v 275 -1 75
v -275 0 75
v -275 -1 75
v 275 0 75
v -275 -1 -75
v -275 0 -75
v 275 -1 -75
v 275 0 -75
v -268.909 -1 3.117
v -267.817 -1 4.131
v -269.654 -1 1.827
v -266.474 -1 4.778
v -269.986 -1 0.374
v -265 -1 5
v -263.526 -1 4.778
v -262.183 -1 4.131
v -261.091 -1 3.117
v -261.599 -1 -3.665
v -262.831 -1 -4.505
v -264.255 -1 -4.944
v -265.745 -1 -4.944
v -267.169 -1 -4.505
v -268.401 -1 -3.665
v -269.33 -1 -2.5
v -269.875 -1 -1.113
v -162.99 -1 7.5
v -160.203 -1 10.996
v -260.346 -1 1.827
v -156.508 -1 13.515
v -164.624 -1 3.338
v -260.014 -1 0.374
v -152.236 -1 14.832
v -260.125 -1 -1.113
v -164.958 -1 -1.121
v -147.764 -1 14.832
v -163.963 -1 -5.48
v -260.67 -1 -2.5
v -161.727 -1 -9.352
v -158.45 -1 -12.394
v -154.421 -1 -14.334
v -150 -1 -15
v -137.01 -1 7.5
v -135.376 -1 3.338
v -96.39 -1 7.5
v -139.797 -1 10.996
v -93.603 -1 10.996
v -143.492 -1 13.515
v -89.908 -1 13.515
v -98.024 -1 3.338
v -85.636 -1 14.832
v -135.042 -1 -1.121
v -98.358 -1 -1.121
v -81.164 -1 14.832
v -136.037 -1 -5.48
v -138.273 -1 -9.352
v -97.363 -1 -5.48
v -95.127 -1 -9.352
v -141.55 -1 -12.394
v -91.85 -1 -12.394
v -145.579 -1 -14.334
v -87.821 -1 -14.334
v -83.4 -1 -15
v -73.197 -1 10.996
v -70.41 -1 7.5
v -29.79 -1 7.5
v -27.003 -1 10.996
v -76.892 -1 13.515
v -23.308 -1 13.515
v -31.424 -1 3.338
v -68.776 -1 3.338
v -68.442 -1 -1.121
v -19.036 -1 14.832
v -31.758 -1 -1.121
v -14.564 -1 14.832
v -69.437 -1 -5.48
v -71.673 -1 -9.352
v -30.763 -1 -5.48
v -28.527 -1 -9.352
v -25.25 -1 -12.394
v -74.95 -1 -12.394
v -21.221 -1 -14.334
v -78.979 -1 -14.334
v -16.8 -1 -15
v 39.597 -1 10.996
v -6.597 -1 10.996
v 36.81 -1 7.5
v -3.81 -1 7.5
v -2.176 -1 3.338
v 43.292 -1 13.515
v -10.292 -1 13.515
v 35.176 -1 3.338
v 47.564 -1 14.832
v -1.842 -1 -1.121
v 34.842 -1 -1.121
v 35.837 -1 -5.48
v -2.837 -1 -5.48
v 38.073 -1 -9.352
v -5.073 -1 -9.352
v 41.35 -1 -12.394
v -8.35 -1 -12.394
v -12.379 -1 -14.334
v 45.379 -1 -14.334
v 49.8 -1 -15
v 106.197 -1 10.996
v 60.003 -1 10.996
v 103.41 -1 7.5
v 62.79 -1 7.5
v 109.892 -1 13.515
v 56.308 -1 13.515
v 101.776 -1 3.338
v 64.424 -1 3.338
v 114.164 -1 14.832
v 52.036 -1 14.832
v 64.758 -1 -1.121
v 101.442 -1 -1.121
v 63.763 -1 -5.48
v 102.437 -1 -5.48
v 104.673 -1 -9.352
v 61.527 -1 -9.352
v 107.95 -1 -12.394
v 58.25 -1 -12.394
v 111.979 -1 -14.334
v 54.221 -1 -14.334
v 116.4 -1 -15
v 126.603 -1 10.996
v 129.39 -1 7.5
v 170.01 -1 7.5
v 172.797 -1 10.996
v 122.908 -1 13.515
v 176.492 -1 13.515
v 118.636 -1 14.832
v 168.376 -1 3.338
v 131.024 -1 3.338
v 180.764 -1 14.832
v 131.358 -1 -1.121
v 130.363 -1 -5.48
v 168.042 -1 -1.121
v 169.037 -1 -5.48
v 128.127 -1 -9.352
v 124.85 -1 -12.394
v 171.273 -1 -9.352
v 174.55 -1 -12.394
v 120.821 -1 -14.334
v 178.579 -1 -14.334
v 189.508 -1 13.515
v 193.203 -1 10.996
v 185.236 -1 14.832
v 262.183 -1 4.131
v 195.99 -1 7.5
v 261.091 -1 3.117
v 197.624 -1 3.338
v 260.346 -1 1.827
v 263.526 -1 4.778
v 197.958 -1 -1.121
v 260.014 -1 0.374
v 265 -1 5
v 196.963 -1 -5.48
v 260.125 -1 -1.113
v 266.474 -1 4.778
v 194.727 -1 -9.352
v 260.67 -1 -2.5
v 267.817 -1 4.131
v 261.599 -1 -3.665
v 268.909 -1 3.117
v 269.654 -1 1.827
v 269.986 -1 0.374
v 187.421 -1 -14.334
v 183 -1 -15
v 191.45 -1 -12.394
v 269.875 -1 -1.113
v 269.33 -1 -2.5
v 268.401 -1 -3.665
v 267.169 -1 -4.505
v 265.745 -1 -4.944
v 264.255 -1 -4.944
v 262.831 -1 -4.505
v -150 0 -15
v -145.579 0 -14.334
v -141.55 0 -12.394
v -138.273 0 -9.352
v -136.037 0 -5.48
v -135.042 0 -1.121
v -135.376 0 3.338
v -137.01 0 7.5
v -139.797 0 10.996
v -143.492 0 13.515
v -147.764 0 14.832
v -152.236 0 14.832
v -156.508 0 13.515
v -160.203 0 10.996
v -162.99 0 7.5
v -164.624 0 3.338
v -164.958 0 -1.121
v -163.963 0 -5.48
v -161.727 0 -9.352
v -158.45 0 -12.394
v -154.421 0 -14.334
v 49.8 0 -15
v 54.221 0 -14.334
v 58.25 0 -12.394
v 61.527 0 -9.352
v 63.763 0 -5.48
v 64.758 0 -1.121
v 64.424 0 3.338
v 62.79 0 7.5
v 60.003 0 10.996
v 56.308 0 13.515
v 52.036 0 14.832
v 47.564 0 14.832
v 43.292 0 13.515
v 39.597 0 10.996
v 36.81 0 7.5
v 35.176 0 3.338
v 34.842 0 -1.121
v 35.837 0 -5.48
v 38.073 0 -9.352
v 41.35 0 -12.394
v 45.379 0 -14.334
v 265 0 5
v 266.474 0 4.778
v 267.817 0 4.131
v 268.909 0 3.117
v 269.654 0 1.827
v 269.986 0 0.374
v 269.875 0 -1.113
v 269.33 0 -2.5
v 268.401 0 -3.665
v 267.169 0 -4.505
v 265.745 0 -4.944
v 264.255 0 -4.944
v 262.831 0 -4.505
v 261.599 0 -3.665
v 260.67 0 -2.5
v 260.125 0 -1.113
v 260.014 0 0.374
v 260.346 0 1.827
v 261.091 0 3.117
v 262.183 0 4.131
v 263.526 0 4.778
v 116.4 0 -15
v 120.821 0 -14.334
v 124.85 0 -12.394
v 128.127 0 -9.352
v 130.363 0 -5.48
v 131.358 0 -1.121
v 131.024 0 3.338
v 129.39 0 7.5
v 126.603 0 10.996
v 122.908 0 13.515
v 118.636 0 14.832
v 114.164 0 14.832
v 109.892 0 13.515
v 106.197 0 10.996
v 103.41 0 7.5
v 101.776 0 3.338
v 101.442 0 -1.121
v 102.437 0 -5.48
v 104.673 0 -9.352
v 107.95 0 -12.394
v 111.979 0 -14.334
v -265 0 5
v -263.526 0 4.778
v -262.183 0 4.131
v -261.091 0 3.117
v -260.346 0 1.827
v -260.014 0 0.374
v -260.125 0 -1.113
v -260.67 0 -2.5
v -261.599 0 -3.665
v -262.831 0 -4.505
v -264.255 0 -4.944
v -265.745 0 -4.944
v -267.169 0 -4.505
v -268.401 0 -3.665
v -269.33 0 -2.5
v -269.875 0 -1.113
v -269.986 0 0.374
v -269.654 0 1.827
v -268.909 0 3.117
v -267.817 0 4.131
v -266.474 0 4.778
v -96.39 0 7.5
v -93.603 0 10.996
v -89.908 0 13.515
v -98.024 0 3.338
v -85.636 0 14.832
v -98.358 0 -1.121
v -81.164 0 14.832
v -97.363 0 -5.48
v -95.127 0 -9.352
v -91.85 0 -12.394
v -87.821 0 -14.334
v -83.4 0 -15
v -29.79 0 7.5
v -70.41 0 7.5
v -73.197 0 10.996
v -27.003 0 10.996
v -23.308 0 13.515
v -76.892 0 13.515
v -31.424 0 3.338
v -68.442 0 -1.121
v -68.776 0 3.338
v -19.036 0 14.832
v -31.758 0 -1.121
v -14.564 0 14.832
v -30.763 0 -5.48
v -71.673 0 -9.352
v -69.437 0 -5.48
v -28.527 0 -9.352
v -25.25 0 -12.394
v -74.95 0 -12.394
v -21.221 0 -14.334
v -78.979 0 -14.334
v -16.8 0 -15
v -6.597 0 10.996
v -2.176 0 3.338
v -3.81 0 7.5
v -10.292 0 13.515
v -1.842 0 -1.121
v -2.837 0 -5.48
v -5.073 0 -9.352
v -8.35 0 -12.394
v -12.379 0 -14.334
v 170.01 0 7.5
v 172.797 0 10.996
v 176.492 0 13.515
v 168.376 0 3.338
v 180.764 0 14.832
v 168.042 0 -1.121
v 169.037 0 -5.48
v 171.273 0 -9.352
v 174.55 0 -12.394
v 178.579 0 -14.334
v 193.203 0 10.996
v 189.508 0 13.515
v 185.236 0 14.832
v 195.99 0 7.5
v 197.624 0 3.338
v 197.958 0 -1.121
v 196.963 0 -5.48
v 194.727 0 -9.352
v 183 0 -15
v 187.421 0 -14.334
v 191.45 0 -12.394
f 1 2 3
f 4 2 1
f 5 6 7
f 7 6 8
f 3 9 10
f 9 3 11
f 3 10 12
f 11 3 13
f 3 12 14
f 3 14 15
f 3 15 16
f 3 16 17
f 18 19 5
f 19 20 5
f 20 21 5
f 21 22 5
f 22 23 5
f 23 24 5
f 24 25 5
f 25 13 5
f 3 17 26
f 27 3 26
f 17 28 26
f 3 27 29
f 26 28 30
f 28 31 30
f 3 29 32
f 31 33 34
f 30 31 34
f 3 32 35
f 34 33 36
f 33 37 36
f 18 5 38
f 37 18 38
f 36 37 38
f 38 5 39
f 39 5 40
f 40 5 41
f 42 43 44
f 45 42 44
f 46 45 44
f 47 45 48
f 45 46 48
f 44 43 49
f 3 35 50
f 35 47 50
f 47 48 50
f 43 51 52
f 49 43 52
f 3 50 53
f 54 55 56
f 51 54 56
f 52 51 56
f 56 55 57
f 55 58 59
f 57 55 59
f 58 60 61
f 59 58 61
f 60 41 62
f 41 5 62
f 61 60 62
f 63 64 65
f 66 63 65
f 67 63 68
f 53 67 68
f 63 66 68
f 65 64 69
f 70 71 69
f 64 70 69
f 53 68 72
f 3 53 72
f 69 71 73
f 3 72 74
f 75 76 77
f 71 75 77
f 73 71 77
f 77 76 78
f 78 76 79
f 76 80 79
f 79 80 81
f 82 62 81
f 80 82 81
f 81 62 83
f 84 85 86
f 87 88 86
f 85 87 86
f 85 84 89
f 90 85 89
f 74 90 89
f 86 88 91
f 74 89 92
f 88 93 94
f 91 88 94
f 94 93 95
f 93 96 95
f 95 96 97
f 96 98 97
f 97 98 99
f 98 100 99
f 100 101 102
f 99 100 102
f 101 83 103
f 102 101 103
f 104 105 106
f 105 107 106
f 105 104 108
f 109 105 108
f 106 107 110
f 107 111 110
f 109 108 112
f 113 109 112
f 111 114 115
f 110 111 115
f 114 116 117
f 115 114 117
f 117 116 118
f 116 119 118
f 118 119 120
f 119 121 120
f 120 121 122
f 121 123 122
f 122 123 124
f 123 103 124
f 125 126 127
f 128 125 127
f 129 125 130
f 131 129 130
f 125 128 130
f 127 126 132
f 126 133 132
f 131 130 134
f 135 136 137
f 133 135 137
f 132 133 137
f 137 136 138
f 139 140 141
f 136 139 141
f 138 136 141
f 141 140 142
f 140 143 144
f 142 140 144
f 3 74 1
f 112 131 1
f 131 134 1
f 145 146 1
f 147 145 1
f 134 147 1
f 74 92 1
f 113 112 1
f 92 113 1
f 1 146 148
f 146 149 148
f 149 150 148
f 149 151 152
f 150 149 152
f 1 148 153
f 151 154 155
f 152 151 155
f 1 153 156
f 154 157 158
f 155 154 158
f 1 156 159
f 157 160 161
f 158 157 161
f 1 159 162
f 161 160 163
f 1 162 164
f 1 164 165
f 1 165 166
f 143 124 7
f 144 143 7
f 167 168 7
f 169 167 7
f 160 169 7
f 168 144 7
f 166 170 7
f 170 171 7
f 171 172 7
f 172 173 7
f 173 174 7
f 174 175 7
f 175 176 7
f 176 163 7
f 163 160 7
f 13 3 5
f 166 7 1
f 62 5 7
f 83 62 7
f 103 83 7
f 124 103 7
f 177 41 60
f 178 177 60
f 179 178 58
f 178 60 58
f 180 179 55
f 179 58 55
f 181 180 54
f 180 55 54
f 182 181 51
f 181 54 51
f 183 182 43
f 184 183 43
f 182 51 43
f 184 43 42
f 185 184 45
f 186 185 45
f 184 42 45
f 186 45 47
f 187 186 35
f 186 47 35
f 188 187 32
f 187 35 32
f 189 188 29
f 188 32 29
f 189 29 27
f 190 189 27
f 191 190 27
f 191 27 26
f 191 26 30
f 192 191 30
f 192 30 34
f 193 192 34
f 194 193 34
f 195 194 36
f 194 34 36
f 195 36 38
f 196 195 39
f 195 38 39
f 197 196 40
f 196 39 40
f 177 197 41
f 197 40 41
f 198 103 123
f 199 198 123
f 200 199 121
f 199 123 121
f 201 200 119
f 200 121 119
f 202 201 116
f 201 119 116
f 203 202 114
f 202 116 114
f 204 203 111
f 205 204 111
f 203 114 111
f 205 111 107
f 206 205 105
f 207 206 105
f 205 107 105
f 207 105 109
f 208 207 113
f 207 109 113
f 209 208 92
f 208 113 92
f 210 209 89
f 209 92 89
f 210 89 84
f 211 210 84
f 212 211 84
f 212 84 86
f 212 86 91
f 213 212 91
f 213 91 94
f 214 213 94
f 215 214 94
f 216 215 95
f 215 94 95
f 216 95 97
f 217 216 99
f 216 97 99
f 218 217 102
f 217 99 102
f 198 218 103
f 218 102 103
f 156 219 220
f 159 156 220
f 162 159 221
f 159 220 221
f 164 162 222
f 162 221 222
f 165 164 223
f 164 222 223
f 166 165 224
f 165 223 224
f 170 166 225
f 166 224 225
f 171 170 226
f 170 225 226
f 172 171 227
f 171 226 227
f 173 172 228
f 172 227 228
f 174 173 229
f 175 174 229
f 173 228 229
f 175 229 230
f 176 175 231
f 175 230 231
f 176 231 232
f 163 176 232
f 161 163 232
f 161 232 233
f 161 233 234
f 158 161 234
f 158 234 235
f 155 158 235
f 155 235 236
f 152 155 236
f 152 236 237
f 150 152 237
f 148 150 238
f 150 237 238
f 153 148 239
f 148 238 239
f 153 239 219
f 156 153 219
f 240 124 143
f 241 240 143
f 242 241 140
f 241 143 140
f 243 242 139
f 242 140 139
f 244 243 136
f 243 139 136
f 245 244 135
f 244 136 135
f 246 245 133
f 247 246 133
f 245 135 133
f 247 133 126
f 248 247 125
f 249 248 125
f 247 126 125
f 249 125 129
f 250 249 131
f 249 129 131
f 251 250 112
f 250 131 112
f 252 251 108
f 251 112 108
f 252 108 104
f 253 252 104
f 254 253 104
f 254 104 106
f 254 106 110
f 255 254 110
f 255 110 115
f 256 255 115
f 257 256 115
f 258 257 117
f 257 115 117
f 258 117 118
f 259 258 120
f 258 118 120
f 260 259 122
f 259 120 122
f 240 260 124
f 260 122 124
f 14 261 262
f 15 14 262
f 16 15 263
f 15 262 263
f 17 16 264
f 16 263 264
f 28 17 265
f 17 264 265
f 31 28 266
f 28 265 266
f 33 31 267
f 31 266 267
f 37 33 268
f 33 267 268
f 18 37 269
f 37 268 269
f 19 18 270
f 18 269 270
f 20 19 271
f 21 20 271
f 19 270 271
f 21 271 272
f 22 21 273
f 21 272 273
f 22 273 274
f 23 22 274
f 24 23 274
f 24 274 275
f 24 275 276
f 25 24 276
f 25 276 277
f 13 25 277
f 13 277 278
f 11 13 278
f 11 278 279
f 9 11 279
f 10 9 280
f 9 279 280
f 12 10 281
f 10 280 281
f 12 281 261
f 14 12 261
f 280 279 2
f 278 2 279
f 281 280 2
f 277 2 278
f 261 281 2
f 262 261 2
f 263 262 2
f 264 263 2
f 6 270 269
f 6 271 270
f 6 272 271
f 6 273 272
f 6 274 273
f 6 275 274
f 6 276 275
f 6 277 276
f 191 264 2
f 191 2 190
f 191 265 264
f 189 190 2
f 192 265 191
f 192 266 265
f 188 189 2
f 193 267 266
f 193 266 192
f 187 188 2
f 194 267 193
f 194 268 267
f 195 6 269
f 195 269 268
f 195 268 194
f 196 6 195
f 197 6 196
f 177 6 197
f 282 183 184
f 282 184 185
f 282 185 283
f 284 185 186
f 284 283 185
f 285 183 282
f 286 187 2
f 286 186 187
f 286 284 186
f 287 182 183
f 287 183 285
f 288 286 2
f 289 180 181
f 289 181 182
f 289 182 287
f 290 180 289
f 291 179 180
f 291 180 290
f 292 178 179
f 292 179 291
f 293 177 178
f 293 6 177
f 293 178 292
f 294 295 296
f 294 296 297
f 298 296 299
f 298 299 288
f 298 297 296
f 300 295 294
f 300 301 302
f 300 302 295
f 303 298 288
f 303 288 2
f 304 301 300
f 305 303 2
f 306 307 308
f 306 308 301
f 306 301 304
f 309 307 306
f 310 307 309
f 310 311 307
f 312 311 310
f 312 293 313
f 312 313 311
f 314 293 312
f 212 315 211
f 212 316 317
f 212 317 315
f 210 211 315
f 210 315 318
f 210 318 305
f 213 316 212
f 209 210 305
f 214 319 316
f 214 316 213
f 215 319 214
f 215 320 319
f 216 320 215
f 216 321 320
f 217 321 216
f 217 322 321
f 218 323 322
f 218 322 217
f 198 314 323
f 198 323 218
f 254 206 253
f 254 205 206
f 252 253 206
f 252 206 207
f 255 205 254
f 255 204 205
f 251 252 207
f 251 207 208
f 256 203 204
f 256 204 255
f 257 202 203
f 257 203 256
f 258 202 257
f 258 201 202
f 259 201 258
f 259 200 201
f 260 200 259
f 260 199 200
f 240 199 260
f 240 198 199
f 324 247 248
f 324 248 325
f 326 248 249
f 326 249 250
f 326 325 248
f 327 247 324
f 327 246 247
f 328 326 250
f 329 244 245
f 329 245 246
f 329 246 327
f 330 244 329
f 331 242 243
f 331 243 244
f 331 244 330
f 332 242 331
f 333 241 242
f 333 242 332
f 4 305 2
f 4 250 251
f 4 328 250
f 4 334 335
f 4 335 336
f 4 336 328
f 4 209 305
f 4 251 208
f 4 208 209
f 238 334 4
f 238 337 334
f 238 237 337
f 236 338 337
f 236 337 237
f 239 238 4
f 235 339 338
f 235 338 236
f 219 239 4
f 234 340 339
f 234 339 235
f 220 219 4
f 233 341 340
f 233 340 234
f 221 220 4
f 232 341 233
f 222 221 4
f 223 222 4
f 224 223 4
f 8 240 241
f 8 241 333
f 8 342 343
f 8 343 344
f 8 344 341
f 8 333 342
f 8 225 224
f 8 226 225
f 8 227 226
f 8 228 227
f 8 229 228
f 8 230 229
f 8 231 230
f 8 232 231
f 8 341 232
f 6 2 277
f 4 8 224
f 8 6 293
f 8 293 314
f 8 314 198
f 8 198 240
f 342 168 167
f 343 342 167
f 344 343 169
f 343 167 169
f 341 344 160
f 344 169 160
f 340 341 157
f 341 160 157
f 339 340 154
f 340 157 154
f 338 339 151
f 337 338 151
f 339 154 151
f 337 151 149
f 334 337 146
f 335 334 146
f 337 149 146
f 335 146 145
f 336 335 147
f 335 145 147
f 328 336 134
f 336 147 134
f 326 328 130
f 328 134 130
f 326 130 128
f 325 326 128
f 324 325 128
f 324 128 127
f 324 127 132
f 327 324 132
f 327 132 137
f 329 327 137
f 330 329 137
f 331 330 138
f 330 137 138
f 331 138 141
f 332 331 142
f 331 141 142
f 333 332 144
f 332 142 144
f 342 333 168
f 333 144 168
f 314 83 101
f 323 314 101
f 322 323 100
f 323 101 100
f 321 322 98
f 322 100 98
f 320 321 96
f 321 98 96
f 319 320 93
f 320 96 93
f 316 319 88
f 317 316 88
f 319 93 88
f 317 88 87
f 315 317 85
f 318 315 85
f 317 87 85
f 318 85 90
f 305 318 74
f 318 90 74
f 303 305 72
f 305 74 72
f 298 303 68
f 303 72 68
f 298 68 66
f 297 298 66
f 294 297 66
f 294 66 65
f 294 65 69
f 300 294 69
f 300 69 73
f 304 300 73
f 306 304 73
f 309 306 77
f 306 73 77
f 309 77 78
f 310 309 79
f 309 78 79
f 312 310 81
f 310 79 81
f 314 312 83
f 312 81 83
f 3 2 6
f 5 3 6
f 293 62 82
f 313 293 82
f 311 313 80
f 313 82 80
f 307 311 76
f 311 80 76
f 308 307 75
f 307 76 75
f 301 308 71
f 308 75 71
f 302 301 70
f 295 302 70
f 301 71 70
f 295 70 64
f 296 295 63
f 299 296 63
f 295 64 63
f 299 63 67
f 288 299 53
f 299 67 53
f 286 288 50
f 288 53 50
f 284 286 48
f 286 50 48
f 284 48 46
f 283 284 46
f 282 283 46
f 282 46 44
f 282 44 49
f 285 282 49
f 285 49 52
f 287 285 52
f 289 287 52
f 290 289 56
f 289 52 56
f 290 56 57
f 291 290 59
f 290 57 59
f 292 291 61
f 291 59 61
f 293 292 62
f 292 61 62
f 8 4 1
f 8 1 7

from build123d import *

# Parameters (mm, degrees)
SKETCH1_W          = 550
SKETCH1_H          = 150
BASE_FLANGE1_DEPTH = 1
SKETCH3_R          = 5
CUT_EXTRUDE1_DEPTH = 1
SKETCH4_R          = 15
CUT_EXTRUDE2_DEPTH = 1
LPATTERN1_COUNT    = 6
LPATTERN1_PITCH    = 66.6


# Sheet-metal steps are written as plain solids
with BuildPart() as part:
    # Sketch1 → Base-Flange1 (new body)
    with BuildSketch(Plane(origin=(0, 0, 0), x_dir=(1, 0, 0), z_dir=(0, 1, 0))):
        Rectangle(SKETCH1_W, SKETCH1_H)
    extrude(amount=-BASE_FLANGE1_DEPTH)

    # Sketch3 → Cut-Extrude1 (cut)
    with BuildSketch(Plane(origin=(0, 0, 0), x_dir=(1, 0, 0), z_dir=(0, 1, 0))):
        with Locations(Location((-265, 0, 0), (0, 0, 270))):
            Circle(SKETCH3_R)
        with Locations(Location((265, 0, 0), (0, 0, 270))):
            Circle(SKETCH3_R)
    extrude(amount=-CUT_EXTRUDE1_DEPTH, mode=Mode.SUBTRACT)

    # Sketch4 → Cut-Extrude2 (cut)
    with BuildSketch(Plane.XZ.offset(1)):
        with Locations(Location((-150, 0, 0), (0, 0, 270))):
            Circle(SKETCH4_R)
    cut_extrude2 = extrude(amount=-CUT_EXTRUDE2_DEPTH, mode=Mode.SUBTRACT)

    # LPattern1: Cut-Extrude2 ×6
    with Locations(*[(i * LPATTERN1_PITCH, 0, 0) for i in range(1, LPATTERN1_COUNT)]):
        add(cut_extrude2, mode=Mode.SUBTRACT)


solid = part.part
